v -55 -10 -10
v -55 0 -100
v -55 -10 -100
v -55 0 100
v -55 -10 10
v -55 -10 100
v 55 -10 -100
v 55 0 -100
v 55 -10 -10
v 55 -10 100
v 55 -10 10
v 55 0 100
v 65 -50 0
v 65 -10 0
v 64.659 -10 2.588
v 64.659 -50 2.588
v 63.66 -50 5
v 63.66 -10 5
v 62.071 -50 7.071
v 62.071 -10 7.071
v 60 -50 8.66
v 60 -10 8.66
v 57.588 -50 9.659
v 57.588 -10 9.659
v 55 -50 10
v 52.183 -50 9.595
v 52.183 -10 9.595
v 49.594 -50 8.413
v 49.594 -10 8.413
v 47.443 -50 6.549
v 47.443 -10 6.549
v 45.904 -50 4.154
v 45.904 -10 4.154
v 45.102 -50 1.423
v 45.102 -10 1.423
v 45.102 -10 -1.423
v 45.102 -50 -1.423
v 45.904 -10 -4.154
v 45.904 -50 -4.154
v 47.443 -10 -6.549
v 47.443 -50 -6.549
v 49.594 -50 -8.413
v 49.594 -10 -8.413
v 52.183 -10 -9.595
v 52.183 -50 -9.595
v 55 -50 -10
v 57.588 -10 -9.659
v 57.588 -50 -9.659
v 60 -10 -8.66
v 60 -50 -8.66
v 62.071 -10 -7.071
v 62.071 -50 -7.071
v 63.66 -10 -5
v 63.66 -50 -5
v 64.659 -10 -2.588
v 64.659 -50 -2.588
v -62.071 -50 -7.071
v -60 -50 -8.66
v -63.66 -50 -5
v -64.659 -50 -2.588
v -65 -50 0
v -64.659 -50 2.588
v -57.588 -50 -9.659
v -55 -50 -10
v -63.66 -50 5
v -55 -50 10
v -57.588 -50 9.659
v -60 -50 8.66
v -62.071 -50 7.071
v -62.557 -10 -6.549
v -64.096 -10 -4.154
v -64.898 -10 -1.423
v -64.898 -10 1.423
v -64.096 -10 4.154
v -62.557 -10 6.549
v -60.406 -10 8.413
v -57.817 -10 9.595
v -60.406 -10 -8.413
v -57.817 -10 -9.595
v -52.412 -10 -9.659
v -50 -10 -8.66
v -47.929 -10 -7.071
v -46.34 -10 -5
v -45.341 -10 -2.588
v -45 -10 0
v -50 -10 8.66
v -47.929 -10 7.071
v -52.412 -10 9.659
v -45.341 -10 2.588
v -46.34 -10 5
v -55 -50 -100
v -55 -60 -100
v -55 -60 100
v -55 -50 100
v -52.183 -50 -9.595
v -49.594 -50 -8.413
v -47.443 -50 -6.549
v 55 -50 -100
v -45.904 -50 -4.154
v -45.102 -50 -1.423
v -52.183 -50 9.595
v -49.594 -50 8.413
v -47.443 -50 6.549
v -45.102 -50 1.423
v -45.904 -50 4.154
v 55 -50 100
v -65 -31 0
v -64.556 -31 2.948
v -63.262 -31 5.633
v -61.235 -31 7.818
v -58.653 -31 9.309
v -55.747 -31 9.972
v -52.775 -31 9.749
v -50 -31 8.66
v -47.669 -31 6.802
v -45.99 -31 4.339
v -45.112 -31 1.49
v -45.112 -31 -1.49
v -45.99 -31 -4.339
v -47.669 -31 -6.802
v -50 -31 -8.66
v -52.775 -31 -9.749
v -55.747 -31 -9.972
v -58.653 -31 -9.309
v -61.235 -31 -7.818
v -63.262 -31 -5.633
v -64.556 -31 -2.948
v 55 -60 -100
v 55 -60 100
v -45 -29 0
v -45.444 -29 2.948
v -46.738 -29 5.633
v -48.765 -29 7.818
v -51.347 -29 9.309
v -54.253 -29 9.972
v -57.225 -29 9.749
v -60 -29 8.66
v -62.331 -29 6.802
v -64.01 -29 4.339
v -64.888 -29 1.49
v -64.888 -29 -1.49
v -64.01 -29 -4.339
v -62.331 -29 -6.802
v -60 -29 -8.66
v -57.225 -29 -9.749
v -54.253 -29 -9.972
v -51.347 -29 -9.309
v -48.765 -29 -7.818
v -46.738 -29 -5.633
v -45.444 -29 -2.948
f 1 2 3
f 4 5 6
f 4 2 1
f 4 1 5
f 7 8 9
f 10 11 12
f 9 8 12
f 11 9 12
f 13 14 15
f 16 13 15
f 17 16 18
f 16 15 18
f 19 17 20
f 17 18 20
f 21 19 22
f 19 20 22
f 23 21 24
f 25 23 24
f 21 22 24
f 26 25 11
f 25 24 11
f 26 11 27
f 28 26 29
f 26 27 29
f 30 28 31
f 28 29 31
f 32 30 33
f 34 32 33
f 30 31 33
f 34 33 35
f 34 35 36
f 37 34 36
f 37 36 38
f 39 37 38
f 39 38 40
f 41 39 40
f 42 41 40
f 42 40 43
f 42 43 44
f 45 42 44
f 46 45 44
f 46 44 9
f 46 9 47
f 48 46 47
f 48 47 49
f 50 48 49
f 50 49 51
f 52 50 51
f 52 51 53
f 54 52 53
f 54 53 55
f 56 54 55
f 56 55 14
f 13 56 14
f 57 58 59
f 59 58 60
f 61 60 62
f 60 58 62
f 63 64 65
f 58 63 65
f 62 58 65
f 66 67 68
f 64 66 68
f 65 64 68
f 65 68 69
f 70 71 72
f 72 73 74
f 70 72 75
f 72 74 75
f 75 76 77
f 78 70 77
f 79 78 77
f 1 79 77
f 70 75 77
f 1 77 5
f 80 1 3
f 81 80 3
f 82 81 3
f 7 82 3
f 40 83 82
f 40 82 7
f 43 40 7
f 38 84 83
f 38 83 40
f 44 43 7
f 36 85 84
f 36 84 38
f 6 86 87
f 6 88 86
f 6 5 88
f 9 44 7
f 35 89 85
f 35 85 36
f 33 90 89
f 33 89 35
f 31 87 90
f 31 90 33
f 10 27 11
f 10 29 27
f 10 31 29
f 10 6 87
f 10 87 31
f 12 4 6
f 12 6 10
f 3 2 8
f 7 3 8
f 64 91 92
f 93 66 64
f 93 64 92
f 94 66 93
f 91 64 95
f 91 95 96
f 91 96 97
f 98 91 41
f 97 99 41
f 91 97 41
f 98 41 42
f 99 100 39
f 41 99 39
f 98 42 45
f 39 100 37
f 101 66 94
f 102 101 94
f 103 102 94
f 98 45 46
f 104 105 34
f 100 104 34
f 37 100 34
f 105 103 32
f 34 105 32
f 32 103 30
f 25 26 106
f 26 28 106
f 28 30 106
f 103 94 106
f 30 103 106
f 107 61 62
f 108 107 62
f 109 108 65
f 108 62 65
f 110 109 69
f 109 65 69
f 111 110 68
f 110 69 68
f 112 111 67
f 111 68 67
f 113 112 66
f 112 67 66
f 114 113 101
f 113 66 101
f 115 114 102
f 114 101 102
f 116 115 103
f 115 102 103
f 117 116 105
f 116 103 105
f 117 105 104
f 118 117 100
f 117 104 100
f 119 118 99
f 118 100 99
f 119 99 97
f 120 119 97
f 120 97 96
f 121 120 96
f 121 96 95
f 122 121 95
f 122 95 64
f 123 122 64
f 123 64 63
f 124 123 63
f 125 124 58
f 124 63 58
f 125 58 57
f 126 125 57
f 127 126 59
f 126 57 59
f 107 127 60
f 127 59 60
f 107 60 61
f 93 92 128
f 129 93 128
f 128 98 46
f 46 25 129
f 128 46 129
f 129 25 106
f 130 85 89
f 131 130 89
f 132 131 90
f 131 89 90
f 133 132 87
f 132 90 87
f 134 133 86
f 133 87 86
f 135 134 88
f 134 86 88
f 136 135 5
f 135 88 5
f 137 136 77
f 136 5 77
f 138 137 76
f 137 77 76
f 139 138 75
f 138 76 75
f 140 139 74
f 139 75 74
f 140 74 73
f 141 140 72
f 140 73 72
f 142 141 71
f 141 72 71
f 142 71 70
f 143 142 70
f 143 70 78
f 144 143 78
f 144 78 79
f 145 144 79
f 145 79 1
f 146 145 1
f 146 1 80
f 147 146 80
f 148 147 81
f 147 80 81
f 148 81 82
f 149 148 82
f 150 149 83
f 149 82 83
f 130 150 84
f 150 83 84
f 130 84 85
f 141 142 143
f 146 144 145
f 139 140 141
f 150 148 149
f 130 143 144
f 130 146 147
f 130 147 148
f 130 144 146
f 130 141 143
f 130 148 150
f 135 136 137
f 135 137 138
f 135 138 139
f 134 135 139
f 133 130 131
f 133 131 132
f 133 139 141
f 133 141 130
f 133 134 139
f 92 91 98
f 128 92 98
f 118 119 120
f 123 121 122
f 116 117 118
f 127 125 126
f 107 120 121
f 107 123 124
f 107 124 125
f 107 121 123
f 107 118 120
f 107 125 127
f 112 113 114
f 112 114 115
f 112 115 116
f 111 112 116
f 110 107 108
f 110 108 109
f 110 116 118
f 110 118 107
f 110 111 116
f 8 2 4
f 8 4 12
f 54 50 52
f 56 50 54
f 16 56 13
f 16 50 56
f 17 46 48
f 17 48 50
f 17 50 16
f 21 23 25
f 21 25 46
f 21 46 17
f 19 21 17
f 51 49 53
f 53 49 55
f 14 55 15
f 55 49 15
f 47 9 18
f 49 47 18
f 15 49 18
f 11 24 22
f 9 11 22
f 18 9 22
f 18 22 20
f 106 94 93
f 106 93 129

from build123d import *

# Parameters (mm, degrees)
F0_W     = 110
F0_H     = 200
F1_DEPTH = 10
F2_R     = 10
F3_DEPTH = 40
F4_W     = 110
F4_H     = 200
F5_DEPTH = 10
F6_R     = 10
F7_DEPTH = 19
F8_R     = 10
F9_DEPTH = 19


with BuildPart() as f1:
    # F0 (on Front) → F1 (new body)
    with BuildSketch(Plane.XZ):
        Rectangle(F0_W, F0_H)
    extrude(amount=F1_DEPTH)

    # F2 (on face) → F3 (join)
    with BuildSketch(Plane.XZ.offset(10)):
        with Locations((55, 0)):
            Circle(F2_R)
    extrude(amount=F3_DEPTH)

    # F4 (on face) → F5 (join)
    with BuildSketch(Plane.XZ.offset(50)):
        Rectangle(F4_W, F4_H)
    extrude(amount=F5_DEPTH)

    # F6 (on face) → F7 (join)
    with BuildSketch(Plane.XZ.offset(10)):
        with Locations((-55, 0)):
            Circle(F6_R)
    extrude(amount=F7_DEPTH)

    # F8 (on face) → F9 (join)
    with BuildSketch(Plane(origin=(0, -50, 0), x_dir=(-1, 0, 0), z_dir=(0, 1, 0))):
        with Locations((55, 0)):
            Circle(F8_R)
    extrude(amount=F9_DEPTH)


solid = f1.part
